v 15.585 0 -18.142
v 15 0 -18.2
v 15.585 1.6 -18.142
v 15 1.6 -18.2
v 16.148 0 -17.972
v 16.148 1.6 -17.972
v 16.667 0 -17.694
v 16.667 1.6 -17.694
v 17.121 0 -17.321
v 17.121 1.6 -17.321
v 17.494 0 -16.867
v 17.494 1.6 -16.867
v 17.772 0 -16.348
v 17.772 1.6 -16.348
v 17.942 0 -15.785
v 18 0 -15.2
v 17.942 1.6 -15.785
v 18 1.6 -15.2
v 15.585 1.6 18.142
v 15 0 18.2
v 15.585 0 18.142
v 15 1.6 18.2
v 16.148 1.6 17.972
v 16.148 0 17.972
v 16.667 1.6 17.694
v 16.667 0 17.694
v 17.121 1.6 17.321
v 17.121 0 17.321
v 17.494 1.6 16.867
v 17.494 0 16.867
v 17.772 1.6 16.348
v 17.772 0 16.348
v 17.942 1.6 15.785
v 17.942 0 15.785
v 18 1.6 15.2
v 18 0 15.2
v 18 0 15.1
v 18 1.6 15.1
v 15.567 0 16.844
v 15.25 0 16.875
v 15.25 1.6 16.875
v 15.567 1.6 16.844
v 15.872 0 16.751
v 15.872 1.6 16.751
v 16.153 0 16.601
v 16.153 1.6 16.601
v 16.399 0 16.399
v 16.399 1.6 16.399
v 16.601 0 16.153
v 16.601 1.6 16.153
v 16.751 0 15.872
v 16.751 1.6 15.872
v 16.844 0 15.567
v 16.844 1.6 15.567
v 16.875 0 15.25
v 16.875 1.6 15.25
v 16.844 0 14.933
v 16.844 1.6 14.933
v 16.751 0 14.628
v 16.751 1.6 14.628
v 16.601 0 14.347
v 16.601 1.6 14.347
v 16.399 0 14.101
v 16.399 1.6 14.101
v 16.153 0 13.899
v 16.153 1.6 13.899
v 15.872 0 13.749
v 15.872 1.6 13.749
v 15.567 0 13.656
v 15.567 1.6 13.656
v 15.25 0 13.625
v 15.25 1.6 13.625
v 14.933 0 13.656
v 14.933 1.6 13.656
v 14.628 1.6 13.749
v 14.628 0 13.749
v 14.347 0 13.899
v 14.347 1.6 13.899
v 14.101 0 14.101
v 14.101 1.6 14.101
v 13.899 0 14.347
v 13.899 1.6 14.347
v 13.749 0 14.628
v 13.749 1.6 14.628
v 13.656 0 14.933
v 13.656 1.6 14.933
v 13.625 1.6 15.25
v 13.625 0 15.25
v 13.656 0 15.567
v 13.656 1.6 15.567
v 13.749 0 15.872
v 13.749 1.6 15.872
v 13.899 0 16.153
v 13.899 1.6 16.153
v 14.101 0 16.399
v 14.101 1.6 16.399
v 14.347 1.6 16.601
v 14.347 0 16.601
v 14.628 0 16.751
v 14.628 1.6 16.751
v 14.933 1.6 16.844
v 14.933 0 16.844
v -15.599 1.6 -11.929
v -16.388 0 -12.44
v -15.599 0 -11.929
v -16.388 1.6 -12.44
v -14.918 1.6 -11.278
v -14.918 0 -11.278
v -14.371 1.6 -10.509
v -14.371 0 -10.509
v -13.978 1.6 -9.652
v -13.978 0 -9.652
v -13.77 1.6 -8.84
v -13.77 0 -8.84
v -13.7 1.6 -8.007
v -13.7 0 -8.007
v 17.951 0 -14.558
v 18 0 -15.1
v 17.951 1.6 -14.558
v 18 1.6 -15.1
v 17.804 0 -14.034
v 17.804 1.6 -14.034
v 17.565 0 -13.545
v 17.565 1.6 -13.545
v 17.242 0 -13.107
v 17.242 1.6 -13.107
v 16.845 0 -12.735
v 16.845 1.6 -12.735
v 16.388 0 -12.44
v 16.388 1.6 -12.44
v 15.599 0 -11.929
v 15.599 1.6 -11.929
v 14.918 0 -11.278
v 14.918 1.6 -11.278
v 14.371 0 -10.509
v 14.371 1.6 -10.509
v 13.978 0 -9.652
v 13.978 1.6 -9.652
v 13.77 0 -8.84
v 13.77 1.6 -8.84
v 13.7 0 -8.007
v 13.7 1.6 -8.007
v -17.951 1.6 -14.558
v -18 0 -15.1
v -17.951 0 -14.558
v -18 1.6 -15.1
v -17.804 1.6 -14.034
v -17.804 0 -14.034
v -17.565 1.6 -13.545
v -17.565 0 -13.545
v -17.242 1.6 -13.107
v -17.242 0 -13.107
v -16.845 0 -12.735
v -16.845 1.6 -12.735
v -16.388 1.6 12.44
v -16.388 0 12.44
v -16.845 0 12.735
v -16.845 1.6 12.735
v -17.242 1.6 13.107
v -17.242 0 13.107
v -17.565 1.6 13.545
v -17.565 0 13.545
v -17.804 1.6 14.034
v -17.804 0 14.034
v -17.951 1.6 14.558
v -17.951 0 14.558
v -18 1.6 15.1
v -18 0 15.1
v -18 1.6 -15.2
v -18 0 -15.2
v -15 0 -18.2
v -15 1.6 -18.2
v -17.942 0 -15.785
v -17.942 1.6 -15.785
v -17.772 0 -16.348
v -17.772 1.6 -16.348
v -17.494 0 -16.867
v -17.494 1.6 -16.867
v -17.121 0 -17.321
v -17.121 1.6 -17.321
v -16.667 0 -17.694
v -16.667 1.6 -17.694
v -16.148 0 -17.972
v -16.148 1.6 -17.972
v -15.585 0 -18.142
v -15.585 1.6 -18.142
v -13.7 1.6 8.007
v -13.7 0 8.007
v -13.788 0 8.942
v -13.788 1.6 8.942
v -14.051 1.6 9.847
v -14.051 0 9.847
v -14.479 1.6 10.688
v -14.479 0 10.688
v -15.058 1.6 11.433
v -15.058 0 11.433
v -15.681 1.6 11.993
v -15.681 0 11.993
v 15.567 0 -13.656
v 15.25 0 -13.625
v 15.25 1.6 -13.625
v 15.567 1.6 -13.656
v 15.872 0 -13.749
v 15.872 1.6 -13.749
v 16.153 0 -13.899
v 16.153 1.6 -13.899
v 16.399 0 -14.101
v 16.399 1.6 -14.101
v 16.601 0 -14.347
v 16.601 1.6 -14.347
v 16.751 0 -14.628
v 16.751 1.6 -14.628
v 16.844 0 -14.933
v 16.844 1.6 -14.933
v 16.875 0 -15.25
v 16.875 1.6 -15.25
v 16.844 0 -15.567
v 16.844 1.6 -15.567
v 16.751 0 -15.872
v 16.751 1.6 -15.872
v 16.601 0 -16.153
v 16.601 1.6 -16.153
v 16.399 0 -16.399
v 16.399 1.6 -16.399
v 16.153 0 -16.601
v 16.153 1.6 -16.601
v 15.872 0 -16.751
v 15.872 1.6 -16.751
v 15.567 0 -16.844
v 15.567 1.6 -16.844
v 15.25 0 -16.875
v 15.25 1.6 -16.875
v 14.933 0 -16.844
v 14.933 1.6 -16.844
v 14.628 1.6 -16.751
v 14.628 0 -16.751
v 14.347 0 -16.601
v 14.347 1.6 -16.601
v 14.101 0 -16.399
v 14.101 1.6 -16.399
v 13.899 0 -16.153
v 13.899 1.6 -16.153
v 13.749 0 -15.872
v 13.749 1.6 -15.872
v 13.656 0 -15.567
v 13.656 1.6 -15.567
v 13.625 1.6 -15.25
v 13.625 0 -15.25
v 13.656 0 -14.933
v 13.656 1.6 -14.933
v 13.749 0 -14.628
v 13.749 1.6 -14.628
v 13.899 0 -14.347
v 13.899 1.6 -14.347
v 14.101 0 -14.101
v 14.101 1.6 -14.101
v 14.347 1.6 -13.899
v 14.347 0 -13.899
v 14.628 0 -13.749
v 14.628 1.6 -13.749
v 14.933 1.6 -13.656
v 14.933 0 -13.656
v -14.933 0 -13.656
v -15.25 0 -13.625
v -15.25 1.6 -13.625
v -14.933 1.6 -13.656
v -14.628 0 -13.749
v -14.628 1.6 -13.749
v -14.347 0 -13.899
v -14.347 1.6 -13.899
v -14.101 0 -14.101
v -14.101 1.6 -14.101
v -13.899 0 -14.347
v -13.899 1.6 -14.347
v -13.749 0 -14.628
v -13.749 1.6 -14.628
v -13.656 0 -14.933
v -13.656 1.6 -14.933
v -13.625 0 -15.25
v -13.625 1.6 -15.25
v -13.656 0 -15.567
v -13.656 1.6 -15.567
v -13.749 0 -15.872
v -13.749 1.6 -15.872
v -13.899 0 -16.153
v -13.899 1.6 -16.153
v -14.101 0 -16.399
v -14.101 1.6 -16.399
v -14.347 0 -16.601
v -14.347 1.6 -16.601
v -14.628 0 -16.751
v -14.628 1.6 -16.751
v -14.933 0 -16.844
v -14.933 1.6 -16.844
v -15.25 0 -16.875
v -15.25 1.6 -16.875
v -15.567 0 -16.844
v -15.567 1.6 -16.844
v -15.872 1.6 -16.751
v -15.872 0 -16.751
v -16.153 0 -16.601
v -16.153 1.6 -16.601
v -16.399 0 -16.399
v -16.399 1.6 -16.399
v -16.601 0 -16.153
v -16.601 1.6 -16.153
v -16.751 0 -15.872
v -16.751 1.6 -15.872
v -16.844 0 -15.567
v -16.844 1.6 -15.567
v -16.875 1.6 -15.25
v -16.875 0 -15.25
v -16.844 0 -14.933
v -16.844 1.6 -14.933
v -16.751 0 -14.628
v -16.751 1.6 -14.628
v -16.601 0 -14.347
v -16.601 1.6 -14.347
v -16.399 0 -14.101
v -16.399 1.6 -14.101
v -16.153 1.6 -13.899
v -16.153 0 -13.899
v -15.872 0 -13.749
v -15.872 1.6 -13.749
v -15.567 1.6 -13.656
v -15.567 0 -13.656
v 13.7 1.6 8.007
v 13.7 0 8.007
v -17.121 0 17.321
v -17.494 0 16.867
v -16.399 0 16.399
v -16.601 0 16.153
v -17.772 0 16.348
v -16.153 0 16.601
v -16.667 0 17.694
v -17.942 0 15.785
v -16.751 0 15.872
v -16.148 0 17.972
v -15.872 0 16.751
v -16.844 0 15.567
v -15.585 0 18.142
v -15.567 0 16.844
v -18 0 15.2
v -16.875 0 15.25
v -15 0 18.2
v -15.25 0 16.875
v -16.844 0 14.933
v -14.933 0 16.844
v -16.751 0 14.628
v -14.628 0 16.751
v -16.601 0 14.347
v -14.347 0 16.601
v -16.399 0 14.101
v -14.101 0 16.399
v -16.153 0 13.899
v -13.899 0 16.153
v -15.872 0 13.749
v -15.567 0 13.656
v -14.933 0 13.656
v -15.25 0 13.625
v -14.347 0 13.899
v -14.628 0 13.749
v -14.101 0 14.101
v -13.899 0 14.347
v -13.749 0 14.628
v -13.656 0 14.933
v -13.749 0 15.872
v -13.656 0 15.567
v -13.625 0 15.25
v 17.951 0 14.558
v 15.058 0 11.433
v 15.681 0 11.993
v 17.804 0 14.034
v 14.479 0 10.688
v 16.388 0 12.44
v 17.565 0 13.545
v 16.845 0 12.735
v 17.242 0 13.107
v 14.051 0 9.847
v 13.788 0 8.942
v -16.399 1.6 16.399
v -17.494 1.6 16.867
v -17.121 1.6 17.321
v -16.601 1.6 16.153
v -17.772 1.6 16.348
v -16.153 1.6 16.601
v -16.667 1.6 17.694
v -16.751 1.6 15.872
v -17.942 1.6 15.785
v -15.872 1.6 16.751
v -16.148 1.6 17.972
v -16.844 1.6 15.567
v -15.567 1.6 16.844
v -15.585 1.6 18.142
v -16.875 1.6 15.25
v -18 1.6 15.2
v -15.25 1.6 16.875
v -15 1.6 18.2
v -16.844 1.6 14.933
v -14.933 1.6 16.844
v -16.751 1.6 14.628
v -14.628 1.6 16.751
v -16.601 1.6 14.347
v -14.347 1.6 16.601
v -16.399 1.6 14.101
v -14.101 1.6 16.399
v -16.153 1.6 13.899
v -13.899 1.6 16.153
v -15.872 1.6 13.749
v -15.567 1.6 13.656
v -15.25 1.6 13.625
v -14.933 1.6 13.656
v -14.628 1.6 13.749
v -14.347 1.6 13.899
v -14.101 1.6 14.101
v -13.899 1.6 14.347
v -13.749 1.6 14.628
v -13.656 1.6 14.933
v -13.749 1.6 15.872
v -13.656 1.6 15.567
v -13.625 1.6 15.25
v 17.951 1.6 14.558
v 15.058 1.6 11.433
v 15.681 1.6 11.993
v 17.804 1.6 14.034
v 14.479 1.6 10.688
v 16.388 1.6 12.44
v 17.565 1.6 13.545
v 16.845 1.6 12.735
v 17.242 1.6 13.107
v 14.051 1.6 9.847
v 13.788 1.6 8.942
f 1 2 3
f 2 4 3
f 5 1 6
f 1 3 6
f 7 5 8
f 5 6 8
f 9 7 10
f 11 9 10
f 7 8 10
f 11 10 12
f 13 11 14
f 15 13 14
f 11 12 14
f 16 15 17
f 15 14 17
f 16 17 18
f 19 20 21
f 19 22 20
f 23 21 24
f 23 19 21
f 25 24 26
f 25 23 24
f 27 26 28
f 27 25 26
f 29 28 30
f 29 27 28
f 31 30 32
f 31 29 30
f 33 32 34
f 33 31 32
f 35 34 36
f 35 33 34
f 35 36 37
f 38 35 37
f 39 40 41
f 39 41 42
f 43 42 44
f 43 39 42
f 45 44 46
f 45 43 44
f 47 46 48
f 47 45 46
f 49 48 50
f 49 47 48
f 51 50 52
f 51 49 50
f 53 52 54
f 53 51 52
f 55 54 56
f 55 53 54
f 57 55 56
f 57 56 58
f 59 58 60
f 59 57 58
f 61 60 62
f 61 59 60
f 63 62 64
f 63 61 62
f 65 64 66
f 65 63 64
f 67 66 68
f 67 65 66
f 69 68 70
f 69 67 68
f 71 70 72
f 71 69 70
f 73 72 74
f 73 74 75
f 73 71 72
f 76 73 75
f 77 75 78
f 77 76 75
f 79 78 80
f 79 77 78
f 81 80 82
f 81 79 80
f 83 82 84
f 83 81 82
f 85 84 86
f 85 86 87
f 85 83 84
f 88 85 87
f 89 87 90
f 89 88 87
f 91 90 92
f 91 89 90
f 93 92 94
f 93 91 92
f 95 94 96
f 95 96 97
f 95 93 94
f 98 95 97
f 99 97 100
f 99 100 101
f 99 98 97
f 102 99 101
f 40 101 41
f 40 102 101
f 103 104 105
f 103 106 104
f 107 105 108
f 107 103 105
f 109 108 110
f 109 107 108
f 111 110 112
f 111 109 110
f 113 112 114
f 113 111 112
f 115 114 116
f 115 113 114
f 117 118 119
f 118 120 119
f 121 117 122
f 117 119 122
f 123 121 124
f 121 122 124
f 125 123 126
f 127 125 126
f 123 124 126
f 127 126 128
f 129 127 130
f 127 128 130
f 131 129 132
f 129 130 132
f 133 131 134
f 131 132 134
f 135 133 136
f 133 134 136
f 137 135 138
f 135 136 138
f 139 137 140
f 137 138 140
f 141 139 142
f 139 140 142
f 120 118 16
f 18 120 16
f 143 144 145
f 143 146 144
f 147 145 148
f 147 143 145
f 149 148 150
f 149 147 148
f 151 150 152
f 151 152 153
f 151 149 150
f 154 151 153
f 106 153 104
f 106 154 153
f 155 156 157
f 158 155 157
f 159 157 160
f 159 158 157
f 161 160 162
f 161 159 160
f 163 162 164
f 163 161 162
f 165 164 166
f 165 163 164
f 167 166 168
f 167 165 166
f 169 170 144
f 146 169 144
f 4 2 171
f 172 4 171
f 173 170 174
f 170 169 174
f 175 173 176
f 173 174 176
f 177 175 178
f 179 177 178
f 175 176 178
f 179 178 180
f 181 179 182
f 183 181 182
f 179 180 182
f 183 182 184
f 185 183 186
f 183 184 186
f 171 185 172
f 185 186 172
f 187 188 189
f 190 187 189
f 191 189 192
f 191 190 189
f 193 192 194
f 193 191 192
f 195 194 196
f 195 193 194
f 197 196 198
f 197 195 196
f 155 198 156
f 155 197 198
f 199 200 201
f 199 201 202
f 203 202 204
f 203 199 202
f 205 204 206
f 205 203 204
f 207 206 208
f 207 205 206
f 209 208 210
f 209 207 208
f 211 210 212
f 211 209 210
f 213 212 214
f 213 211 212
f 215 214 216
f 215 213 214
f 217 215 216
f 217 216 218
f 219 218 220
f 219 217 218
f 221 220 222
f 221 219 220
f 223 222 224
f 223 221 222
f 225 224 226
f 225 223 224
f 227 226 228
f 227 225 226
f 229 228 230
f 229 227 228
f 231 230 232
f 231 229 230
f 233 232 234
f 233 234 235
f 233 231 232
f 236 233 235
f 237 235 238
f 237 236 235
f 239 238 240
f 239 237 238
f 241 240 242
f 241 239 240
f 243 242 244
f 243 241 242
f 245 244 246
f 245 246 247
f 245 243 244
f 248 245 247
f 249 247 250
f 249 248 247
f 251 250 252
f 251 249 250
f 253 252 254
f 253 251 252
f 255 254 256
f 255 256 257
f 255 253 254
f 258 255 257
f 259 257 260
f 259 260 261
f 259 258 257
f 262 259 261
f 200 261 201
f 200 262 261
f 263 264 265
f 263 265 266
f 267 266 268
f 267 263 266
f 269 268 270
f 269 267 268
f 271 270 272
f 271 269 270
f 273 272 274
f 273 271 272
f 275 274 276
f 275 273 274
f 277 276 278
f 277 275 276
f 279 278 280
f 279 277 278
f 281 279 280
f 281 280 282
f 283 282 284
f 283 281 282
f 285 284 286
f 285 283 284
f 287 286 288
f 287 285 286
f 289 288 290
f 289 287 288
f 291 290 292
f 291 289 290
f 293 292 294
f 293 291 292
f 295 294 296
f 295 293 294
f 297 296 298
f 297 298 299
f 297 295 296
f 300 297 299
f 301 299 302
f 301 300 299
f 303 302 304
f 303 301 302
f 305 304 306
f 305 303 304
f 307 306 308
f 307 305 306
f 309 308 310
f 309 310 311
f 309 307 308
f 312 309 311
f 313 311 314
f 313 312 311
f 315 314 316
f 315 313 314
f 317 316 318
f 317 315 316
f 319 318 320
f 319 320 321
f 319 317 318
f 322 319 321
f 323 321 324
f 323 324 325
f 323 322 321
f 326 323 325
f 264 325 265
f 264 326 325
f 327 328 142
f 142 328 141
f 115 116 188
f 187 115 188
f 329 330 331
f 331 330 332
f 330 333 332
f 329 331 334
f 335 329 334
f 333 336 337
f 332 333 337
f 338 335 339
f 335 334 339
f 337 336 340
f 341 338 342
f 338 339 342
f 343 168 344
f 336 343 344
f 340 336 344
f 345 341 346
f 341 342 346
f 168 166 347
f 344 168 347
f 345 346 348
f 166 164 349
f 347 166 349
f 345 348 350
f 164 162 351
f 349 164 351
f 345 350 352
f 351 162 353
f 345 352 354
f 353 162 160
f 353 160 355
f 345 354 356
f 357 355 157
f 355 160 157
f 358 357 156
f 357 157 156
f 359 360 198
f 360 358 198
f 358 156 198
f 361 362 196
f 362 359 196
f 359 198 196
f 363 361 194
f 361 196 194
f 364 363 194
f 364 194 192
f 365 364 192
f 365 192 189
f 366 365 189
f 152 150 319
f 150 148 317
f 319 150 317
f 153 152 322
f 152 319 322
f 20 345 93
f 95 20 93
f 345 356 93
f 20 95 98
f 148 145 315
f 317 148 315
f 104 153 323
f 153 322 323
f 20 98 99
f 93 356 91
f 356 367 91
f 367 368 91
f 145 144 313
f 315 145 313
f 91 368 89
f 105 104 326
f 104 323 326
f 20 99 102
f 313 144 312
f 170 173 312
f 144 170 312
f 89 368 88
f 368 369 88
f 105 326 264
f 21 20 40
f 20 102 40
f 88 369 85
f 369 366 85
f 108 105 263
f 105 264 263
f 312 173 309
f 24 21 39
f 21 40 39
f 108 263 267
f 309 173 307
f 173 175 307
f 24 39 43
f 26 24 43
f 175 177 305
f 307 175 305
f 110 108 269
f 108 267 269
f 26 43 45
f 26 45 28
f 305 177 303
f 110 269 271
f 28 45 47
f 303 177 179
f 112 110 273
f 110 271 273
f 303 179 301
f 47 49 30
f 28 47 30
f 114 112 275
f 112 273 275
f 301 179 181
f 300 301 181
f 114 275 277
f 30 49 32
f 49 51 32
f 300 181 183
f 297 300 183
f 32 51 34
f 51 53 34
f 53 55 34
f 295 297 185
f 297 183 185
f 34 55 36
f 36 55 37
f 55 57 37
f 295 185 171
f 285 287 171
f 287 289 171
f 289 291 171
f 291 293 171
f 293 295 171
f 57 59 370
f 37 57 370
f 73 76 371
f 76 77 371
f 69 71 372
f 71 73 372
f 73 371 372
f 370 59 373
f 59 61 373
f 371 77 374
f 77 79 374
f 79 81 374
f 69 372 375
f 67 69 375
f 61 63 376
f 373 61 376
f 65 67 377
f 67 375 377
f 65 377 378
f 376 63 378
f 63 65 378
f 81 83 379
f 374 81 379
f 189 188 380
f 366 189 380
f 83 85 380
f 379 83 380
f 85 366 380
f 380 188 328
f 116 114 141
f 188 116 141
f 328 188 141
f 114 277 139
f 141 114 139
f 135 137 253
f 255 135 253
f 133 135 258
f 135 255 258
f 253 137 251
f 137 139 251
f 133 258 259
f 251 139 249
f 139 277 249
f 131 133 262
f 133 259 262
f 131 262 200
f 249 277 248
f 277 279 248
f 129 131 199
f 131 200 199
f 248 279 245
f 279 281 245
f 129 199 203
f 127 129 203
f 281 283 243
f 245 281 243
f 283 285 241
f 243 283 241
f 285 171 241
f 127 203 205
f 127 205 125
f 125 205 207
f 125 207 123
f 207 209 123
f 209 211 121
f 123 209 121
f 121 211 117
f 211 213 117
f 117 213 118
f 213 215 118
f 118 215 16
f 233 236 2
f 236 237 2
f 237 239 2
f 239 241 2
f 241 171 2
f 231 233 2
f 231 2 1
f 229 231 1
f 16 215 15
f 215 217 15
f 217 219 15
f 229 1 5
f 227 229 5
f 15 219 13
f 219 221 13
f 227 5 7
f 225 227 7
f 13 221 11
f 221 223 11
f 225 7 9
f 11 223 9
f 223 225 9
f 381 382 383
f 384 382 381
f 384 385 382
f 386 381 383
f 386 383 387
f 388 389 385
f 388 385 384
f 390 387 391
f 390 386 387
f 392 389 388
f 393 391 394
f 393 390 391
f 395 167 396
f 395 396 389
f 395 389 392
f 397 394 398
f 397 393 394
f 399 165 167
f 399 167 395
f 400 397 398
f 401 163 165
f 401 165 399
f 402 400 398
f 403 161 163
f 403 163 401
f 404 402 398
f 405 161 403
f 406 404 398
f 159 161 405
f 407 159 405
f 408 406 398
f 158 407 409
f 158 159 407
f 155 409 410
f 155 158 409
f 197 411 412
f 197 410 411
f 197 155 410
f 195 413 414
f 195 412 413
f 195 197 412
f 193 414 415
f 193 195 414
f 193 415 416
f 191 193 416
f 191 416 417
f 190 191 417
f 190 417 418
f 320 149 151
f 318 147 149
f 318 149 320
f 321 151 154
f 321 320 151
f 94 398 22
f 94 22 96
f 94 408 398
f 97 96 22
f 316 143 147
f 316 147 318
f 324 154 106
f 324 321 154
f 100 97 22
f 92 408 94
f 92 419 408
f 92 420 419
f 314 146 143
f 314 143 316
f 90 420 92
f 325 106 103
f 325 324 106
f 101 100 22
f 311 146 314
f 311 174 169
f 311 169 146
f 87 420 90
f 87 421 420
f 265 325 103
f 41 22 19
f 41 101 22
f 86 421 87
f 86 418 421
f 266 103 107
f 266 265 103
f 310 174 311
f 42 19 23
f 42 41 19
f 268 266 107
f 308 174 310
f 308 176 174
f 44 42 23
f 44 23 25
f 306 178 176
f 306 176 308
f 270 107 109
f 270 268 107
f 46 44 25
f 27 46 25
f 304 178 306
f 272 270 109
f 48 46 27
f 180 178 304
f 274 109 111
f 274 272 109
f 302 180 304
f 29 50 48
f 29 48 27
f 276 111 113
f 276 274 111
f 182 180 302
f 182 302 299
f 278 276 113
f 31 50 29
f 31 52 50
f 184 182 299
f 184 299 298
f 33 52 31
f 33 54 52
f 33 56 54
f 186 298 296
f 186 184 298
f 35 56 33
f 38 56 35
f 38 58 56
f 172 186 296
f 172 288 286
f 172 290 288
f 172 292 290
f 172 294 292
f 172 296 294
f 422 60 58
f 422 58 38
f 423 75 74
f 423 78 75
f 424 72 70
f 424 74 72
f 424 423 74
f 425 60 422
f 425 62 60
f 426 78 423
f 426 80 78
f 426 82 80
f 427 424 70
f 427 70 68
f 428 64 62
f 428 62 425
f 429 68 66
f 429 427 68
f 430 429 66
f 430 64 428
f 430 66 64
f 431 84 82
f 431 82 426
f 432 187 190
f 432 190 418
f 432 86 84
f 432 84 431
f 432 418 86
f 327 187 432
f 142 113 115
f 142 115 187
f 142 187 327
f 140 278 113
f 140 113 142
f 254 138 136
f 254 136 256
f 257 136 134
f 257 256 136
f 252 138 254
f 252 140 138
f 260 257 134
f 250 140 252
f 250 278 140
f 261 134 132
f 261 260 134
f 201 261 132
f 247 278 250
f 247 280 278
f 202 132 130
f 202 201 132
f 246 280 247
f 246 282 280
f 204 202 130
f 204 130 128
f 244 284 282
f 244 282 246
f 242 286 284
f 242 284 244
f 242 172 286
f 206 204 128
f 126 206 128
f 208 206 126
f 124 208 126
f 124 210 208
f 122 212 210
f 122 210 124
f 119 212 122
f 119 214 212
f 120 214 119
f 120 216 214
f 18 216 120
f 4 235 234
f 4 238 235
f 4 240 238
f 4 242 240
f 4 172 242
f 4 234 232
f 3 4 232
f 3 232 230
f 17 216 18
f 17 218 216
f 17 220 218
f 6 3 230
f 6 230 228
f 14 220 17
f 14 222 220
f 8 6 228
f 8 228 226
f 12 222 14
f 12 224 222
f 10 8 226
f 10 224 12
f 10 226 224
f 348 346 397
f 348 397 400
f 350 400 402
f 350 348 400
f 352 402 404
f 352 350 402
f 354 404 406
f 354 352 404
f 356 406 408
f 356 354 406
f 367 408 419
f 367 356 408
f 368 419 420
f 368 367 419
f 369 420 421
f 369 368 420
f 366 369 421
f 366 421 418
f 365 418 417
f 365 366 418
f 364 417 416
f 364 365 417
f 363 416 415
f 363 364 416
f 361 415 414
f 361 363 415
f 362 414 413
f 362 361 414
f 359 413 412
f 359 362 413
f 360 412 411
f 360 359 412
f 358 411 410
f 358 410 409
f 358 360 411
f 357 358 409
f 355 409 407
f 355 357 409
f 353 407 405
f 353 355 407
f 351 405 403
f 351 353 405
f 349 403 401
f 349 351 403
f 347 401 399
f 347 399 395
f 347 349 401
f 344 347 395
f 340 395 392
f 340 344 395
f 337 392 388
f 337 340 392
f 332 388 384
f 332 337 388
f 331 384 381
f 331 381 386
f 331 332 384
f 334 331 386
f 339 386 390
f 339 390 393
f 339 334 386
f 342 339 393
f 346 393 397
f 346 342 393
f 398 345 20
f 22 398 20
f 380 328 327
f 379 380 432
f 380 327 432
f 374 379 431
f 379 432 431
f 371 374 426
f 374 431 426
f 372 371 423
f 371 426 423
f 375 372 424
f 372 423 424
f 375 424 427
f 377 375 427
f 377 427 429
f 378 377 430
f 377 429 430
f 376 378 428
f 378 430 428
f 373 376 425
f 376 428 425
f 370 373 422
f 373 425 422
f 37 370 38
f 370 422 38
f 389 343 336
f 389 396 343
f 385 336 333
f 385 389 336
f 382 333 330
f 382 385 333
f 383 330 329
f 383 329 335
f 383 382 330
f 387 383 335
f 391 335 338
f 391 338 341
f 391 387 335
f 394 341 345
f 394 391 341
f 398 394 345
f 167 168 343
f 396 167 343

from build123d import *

# Parameters (mm, degrees)
SKETCH1_R           = 1.625
BOSS_EXTRUDE1_DEPTH = 1.6
FILLET1_R           = 3
FILLET2_R           = 5


with BuildPart() as part:
    # Sketch1 → Boss-Extrude1 (new body)
    with BuildSketch(Plane(origin=(0, 0, 0), x_dir=(1, 0, 0), z_dir=(0, 1, 0))):
        Polygon((-18, 18.2), (-18, 12.1), (-13.7, 12.1), (-13.7, -12.1), (-18, -12.1), (-18, -18.2), (18, -18.2), (18, -12.1), (13.7, -12.1), (13.7, 12.1), (18, 12.1), (18, 18.2), align=None)
        with Locations(Location((15.25, -15.25, 0), (0, 0, 270))):
            Circle(SKETCH1_R, mode=Mode.SUBTRACT)
        with Locations(Location((15.25, 15.25, 0), (0, 0, 270))):
            Circle(SKETCH1_R, mode=Mode.SUBTRACT)
        with Locations(Location((-15.25, 15.25, 0), (0, 0, 270))):
            Circle(SKETCH1_R, mode=Mode.SUBTRACT)
        with Locations(Location((-15.25, -15.25, 0), (0, 0, 270))):
            Circle(SKETCH1_R, mode=Mode.SUBTRACT)
    extrude(amount=BOSS_EXTRUDE1_DEPTH)

    # Fillet1
    fillet1_edges = [part.edges().sort_by_distance(p)[0] for p in [
        (-18, 0.8, 18.2),
        (-18, 0.8, 12.1),
        (-18, 0.8, -12.1),
        (-18, 0.8, -18.2),
        (18, 0.8, -18.2),
        (18, 0.8, -12.1),
        (18, 0.8, 12.1),
        (18, 0.8, 18.2),
    ]]
    fillet(fillet1_edges, radius=FILLET1_R)

    # Fillet2
    fillet2_edges = [part.edges().sort_by_distance(p)[0] for p in [
        (13.7, 0.8, -12.1),
        (13.7, 0.8, 12.1),
        (-13.7, 0.8, 12.1),
        (-13.7, 0.8, -12.1),
    ]]
    fillet(fillet2_edges, radius=FILLET2_R)


solid = part.part
